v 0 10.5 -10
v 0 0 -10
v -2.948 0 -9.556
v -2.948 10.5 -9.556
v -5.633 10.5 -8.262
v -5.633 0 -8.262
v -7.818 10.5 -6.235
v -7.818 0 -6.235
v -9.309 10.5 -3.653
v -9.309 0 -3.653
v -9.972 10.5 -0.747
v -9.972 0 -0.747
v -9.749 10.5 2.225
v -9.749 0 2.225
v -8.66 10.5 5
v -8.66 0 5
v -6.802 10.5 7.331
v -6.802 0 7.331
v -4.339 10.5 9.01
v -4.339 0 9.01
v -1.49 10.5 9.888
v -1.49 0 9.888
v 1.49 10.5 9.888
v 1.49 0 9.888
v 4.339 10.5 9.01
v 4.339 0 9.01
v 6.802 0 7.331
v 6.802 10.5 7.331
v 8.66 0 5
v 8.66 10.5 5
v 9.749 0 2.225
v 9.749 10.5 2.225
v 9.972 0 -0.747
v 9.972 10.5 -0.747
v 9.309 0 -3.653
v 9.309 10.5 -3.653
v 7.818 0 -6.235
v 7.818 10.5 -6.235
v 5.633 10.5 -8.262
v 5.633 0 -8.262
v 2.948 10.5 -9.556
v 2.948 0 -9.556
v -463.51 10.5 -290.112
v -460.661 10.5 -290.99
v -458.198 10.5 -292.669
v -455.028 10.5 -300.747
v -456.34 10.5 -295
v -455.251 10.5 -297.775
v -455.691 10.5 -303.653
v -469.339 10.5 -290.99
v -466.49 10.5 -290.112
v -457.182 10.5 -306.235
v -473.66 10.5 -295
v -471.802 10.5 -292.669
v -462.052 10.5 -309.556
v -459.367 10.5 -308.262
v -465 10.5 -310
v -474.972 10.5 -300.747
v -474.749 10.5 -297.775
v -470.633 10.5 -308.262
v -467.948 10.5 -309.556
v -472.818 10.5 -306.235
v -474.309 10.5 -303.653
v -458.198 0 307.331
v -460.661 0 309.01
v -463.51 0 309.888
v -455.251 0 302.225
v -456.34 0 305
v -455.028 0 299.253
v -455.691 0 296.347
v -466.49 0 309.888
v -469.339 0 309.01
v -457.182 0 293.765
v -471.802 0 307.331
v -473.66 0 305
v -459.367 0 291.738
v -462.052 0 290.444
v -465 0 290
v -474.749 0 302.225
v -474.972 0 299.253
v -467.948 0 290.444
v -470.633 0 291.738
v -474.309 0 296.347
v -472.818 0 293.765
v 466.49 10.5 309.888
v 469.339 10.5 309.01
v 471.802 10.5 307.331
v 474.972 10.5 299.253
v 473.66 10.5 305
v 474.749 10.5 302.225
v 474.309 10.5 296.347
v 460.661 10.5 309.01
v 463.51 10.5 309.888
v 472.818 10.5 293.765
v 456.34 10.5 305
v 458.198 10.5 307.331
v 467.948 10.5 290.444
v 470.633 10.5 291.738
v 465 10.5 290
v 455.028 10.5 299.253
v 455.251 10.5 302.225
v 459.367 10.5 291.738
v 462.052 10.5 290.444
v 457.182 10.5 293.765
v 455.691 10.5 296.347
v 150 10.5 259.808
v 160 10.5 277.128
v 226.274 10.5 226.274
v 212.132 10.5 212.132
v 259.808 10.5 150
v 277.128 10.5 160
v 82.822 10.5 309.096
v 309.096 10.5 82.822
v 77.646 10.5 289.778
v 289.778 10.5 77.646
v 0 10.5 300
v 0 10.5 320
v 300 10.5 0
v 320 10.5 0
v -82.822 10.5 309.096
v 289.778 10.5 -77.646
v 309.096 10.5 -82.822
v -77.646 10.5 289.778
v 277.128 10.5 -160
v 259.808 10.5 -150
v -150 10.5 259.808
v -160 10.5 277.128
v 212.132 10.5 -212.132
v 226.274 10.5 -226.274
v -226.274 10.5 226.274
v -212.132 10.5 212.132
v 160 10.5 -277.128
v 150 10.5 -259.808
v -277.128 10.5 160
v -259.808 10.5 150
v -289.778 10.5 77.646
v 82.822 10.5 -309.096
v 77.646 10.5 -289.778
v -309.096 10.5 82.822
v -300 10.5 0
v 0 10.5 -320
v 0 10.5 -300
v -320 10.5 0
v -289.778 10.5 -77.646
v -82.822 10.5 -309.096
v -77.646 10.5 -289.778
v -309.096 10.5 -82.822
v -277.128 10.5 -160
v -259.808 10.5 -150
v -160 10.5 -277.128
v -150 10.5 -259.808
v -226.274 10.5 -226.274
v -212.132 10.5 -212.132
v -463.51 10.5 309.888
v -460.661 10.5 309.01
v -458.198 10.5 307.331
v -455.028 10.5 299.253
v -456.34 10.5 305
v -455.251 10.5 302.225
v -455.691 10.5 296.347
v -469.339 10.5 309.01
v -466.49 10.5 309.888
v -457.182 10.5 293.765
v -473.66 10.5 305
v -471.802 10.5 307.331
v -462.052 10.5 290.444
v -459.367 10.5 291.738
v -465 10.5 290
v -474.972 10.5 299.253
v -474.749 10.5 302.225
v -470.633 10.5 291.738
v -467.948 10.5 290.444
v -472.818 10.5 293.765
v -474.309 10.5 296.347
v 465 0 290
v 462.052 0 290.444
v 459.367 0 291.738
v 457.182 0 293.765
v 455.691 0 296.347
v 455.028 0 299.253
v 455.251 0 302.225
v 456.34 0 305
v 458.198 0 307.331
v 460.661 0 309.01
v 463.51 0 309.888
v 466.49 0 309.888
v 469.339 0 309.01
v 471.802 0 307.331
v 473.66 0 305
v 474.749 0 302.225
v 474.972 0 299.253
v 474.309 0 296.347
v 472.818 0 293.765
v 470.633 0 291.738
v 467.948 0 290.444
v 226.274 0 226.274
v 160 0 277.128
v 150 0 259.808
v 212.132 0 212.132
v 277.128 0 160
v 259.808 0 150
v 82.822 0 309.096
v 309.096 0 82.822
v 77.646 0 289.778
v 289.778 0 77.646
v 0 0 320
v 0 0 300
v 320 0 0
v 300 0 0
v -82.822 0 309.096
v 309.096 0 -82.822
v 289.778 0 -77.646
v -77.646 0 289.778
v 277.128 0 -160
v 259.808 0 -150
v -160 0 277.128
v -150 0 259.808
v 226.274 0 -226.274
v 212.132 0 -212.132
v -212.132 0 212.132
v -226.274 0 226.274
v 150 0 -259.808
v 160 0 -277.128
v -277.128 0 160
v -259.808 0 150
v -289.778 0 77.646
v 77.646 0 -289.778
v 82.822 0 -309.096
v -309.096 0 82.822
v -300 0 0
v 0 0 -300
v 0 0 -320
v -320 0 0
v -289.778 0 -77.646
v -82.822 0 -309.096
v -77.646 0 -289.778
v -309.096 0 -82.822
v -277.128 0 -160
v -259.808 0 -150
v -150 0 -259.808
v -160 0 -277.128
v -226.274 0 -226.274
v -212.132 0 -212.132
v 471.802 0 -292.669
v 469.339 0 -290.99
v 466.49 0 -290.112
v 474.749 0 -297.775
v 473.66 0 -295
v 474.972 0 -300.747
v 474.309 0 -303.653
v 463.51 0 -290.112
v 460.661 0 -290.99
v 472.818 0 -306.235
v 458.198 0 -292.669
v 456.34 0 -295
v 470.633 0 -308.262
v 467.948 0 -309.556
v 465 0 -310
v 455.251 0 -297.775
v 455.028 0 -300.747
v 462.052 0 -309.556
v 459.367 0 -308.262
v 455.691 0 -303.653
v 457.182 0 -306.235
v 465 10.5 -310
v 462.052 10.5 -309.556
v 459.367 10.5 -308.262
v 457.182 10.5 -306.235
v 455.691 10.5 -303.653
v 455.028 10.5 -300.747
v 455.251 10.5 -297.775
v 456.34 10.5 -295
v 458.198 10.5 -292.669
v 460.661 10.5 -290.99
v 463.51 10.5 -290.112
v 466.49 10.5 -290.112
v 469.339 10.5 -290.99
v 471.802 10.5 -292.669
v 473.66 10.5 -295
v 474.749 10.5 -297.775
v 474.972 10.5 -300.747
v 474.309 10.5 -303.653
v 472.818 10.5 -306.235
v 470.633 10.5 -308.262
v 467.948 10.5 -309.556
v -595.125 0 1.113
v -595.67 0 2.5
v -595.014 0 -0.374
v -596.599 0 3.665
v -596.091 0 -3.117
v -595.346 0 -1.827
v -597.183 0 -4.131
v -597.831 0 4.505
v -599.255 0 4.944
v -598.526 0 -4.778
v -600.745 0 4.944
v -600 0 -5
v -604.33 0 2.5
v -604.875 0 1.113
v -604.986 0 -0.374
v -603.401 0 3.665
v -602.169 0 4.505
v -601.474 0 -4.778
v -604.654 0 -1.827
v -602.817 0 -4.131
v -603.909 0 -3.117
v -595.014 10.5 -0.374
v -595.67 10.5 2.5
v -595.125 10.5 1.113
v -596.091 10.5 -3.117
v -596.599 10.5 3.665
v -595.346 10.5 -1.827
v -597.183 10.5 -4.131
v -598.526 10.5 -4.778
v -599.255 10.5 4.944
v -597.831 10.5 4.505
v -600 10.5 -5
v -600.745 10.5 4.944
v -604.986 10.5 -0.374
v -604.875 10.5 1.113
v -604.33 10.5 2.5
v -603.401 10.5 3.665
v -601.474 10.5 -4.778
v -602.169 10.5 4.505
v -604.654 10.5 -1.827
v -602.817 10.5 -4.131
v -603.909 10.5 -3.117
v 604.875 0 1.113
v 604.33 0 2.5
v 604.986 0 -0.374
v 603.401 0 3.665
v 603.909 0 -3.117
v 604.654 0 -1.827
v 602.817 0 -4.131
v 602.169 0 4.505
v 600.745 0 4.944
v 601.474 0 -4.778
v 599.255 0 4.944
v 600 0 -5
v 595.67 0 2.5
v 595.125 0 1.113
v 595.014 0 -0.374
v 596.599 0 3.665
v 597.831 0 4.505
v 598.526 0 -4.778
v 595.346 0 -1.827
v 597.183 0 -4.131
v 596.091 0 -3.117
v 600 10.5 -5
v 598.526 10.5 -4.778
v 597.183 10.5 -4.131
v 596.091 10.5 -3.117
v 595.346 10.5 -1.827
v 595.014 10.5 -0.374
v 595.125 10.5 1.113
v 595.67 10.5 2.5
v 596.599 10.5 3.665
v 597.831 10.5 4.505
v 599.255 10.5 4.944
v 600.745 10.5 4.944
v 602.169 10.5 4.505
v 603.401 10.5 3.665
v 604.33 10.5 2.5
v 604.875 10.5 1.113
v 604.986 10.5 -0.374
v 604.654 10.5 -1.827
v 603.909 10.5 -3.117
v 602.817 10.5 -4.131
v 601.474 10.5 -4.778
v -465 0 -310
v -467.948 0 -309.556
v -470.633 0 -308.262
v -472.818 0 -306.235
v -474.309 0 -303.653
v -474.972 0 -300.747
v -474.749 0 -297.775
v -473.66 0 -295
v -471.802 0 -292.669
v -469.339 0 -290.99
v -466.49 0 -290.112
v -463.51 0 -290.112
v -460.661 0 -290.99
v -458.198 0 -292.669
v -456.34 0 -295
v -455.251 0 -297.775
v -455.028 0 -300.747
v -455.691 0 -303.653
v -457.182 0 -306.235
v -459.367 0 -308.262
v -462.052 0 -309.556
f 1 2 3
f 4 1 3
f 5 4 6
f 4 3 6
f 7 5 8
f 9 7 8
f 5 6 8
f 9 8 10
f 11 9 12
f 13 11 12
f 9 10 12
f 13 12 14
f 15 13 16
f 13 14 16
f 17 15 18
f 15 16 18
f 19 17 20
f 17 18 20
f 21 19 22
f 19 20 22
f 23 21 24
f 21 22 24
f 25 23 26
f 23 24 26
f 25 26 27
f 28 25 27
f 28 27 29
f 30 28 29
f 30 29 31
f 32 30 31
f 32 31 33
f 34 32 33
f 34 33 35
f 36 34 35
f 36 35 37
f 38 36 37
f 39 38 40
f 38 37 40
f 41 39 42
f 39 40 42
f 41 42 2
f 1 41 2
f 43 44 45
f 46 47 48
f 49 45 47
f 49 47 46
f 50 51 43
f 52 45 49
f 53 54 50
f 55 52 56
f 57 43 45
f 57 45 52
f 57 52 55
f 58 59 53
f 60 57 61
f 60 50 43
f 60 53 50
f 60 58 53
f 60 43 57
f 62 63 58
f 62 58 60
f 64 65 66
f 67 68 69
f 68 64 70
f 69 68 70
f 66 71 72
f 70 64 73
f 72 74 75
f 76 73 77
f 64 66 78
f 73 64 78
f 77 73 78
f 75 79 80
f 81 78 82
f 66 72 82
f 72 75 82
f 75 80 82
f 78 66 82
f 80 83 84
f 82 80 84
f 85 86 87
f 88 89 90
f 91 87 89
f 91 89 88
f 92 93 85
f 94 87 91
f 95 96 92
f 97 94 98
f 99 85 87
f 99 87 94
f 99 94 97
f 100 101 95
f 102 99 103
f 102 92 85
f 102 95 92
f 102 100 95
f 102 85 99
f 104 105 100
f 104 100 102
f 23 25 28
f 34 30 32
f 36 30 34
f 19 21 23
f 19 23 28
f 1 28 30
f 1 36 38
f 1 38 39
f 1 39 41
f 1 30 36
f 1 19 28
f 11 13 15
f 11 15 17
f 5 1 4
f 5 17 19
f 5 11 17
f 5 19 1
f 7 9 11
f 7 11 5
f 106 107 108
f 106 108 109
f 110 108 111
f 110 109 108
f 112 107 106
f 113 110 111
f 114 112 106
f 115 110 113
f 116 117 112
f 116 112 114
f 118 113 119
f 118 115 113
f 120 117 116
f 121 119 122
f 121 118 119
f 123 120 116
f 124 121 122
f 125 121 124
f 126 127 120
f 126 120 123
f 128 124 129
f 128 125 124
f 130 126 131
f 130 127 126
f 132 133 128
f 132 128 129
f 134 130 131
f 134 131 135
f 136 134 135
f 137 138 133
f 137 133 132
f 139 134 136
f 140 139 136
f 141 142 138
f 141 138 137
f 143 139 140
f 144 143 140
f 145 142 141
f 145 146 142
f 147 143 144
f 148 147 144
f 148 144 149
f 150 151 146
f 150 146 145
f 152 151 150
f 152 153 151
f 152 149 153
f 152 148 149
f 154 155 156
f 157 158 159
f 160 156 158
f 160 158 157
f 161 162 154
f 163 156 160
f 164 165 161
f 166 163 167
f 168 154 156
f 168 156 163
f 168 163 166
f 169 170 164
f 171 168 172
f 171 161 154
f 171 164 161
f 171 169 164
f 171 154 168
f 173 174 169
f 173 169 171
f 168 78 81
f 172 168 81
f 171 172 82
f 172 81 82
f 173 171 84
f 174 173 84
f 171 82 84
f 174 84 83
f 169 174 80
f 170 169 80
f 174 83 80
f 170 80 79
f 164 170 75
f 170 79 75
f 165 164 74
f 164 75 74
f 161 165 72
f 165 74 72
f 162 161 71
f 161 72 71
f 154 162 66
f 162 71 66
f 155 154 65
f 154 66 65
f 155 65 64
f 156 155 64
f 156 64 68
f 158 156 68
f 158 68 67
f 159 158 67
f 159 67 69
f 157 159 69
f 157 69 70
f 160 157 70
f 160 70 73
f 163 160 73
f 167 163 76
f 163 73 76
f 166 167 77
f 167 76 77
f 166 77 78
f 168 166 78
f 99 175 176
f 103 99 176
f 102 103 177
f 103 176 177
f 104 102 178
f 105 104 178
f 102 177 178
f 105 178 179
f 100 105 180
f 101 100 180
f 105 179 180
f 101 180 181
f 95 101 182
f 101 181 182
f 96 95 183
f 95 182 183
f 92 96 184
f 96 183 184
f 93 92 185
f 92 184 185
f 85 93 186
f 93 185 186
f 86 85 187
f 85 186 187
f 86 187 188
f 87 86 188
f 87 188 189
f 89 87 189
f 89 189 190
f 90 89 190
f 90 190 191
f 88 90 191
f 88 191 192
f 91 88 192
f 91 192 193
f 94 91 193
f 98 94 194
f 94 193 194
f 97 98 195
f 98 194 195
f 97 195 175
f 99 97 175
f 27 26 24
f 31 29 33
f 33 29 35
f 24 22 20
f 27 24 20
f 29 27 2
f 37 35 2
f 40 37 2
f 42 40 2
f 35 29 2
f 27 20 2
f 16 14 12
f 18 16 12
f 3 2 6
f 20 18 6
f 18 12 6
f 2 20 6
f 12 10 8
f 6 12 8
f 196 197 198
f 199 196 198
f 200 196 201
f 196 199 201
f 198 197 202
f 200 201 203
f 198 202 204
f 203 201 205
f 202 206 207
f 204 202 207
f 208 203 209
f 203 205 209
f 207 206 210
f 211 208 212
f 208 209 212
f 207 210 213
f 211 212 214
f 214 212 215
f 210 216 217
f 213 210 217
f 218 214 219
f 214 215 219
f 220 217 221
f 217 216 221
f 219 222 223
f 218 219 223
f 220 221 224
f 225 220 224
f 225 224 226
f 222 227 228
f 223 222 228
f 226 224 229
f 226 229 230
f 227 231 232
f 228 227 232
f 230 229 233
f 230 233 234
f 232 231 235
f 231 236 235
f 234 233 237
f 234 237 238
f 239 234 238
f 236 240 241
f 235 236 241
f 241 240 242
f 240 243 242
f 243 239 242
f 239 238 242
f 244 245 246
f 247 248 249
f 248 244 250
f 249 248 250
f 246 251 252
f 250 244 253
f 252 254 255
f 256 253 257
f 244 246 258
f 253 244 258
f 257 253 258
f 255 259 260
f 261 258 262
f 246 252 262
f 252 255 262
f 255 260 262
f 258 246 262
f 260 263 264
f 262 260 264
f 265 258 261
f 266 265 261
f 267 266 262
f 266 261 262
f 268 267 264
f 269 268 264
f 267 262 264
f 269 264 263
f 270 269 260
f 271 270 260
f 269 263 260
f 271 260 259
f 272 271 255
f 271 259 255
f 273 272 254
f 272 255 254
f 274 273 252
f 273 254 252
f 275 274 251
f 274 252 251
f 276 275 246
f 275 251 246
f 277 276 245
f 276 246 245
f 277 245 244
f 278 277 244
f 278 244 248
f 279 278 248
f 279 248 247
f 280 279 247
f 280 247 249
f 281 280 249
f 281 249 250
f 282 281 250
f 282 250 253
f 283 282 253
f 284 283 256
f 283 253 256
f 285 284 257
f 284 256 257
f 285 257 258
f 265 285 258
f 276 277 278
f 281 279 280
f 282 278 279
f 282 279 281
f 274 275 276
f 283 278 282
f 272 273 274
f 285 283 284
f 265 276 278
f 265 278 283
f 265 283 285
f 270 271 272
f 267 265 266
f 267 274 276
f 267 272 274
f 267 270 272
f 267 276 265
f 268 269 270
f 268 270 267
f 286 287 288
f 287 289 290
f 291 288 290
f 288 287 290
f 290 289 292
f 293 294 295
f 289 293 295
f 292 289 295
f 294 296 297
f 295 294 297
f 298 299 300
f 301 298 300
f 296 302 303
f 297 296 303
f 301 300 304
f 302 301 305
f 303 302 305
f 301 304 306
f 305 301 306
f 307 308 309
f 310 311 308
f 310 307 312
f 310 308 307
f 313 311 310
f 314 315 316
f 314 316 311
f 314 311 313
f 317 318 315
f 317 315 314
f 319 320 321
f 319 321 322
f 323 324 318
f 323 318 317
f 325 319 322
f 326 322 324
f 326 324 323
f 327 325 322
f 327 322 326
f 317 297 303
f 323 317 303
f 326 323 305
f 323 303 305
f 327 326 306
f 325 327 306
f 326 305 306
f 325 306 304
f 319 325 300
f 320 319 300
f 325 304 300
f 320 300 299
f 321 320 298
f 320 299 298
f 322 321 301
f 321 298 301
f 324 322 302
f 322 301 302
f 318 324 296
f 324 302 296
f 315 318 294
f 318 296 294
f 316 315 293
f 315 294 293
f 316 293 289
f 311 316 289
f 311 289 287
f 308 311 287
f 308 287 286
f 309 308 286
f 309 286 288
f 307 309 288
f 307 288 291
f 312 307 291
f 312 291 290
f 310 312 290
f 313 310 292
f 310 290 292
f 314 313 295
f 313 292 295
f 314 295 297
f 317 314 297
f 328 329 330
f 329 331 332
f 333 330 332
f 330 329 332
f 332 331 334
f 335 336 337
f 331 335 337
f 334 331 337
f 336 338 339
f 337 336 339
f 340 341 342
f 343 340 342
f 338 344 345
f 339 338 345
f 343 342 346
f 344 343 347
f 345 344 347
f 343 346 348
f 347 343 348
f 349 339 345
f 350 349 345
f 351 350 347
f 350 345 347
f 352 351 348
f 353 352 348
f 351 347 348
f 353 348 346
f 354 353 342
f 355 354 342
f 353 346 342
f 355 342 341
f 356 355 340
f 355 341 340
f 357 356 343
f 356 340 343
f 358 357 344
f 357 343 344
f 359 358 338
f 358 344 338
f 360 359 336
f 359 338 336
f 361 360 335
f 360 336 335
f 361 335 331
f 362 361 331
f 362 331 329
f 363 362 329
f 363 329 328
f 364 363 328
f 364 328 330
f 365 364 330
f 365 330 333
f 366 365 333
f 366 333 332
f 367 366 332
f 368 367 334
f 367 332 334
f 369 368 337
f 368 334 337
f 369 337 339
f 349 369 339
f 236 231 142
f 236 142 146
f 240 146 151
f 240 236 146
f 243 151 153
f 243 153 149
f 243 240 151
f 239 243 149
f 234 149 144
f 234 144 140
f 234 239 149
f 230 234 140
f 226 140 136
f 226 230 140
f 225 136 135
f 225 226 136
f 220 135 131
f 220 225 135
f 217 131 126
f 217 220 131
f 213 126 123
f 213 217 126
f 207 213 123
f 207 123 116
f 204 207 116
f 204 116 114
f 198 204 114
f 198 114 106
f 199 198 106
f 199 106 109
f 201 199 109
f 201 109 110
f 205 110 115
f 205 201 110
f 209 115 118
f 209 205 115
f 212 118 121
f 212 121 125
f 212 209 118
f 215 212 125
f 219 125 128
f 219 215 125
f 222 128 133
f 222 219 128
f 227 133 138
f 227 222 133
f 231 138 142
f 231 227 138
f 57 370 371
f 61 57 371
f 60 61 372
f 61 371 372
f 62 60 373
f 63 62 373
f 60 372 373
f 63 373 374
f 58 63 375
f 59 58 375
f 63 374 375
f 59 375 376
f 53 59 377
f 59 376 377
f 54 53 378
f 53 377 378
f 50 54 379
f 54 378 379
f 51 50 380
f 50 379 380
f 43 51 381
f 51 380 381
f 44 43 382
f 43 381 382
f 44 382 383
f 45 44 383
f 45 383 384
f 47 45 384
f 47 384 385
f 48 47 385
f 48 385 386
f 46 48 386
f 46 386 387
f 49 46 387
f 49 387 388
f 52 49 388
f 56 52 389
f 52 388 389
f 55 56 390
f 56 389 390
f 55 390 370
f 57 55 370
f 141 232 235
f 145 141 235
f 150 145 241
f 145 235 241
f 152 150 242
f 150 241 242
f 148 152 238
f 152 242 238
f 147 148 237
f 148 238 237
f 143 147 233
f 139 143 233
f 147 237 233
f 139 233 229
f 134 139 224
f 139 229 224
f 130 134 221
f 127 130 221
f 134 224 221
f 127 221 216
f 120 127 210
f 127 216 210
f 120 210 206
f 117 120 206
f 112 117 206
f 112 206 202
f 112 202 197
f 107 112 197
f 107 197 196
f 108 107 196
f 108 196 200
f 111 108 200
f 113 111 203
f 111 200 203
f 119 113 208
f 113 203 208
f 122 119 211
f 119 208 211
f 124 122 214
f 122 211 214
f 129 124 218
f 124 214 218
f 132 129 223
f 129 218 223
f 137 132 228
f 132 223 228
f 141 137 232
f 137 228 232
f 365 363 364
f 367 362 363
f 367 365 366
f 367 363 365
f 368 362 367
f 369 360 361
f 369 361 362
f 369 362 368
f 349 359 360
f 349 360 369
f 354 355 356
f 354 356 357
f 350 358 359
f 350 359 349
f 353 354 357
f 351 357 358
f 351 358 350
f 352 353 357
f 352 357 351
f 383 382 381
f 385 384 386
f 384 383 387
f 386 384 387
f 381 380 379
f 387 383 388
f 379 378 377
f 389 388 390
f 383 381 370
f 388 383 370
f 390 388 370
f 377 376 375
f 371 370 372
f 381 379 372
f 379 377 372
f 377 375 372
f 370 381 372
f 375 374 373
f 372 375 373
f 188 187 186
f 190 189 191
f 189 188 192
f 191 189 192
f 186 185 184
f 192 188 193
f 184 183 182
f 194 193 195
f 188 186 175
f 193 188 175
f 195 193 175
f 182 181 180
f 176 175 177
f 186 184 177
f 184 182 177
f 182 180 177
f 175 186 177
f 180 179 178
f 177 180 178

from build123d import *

# Parameters (mm, degrees)
SKETCH_1_R        = 10
EXTRUDE_1_DEPTH   = 10.5
EXTRUDE_1_2_DEPTH = 10.5
EXTRUDE_1_3_DEPTH = 10.5
EXTRUDE_1_4_DEPTH = 10.5
EXTRUDE_1_5_DEPTH = 10.5
SKETCH_1_R_2      = 5
EXTRUDE_1_6_DEPTH = 10.5
EXTRUDE_1_7_DEPTH = 10.5
SKETCH_1_R_3      = 320
SKETCH_1_R_4      = 300
EXTRUDE_1_8_DEPTH = 10.5


with BuildPart() as part:
    # Эскиз1 → Выдавливание1 (new body)
    with BuildSketch(Plane(origin=(0, 0, 0), x_dir=(-1, 0, 0), z_dir=(0, 1, 0))):
        with Locations(Location((-465, -300, 0), (0, 0, 270))):
            Circle(SKETCH_1_R)
    extrude(amount=EXTRUDE_1_DEPTH)


with BuildPart() as body_2:
    # Эскиз1 → Extrude 1 2 (new body)
    with BuildSketch(Plane(origin=(0, 0, 0), x_dir=(-1, 0, 0), z_dir=(0, 1, 0))):
        with Locations(Location((-465, 300, 0), (0, 0, 270))):
            Circle(SKETCH_1_R)
    extrude(amount=EXTRUDE_1_2_DEPTH)


with BuildPart() as body_3:
    # Эскиз1 → Extrude 1 3 (new body)
    with BuildSketch(Plane(origin=(0, 0, 0), x_dir=(-1, 0, 0), z_dir=(0, 1, 0))):
        with Locations(Location((465, 300, 0), (0, 0, 270))):
            Circle(SKETCH_1_R)
    extrude(amount=EXTRUDE_1_3_DEPTH)


with BuildPart() as body_4:
    # Эскиз1 → Extrude 1 4 (new body)
    with BuildSketch(Plane(origin=(0, 0, 0), x_dir=(-1, 0, 0), z_dir=(0, 1, 0))):
        with Locations(Location((0, 0, 0), (0, 0, 270))):
            Circle(SKETCH_1_R)
    extrude(amount=EXTRUDE_1_4_DEPTH)


with BuildPart() as body_5:
    # Эскиз1 → Extrude 1 5 (new body)
    with BuildSketch(Plane(origin=(0, 0, 0), x_dir=(-1, 0, 0), z_dir=(0, 1, 0))):
        with Locations(Location((465, -300, 0), (0, 0, 270))):
            Circle(SKETCH_1_R)
    extrude(amount=EXTRUDE_1_5_DEPTH)


with BuildPart() as body_6:
    # Эскиз1 → Extrude 1 6 (new body)
    with BuildSketch(Plane(origin=(0, 0, 0), x_dir=(-1, 0, 0), z_dir=(0, 1, 0))):
        with Locations(Location((-600, 0, 0), (0, 0, 270))):
            Circle(SKETCH_1_R_2)
    extrude(amount=EXTRUDE_1_6_DEPTH)


with BuildPart() as body_7:
    # Эскиз1 → Extrude 1 7 (new body)
    with BuildSketch(Plane(origin=(0, 0, 0), x_dir=(-1, 0, 0), z_dir=(0, 1, 0))):
        with Locations(Location((600, 0, 0), (0, 0, 270))):
            Circle(SKETCH_1_R_2)
    extrude(amount=EXTRUDE_1_7_DEPTH)


with BuildPart() as body_8:
    # Эскиз1 → Extrude 1 8 (new body)
    with BuildSketch(Plane(origin=(0, 0, 0), x_dir=(-1, 0, 0), z_dir=(0, 1, 0))):
        with Locations(Location((0, 0, 0), (0, 0, 270))):
            Circle(SKETCH_1_R_3)
        with Locations(Location((0, 0, 0), (0, 0, 270))):
            Circle(SKETCH_1_R_4, mode=Mode.SUBTRACT)
    extrude(amount=EXTRUDE_1_8_DEPTH)


solid = Compound([part.part, body_2.part, body_3.part, body_4.part, body_5.part, body_6.part, body_7.part, body_8.part])
